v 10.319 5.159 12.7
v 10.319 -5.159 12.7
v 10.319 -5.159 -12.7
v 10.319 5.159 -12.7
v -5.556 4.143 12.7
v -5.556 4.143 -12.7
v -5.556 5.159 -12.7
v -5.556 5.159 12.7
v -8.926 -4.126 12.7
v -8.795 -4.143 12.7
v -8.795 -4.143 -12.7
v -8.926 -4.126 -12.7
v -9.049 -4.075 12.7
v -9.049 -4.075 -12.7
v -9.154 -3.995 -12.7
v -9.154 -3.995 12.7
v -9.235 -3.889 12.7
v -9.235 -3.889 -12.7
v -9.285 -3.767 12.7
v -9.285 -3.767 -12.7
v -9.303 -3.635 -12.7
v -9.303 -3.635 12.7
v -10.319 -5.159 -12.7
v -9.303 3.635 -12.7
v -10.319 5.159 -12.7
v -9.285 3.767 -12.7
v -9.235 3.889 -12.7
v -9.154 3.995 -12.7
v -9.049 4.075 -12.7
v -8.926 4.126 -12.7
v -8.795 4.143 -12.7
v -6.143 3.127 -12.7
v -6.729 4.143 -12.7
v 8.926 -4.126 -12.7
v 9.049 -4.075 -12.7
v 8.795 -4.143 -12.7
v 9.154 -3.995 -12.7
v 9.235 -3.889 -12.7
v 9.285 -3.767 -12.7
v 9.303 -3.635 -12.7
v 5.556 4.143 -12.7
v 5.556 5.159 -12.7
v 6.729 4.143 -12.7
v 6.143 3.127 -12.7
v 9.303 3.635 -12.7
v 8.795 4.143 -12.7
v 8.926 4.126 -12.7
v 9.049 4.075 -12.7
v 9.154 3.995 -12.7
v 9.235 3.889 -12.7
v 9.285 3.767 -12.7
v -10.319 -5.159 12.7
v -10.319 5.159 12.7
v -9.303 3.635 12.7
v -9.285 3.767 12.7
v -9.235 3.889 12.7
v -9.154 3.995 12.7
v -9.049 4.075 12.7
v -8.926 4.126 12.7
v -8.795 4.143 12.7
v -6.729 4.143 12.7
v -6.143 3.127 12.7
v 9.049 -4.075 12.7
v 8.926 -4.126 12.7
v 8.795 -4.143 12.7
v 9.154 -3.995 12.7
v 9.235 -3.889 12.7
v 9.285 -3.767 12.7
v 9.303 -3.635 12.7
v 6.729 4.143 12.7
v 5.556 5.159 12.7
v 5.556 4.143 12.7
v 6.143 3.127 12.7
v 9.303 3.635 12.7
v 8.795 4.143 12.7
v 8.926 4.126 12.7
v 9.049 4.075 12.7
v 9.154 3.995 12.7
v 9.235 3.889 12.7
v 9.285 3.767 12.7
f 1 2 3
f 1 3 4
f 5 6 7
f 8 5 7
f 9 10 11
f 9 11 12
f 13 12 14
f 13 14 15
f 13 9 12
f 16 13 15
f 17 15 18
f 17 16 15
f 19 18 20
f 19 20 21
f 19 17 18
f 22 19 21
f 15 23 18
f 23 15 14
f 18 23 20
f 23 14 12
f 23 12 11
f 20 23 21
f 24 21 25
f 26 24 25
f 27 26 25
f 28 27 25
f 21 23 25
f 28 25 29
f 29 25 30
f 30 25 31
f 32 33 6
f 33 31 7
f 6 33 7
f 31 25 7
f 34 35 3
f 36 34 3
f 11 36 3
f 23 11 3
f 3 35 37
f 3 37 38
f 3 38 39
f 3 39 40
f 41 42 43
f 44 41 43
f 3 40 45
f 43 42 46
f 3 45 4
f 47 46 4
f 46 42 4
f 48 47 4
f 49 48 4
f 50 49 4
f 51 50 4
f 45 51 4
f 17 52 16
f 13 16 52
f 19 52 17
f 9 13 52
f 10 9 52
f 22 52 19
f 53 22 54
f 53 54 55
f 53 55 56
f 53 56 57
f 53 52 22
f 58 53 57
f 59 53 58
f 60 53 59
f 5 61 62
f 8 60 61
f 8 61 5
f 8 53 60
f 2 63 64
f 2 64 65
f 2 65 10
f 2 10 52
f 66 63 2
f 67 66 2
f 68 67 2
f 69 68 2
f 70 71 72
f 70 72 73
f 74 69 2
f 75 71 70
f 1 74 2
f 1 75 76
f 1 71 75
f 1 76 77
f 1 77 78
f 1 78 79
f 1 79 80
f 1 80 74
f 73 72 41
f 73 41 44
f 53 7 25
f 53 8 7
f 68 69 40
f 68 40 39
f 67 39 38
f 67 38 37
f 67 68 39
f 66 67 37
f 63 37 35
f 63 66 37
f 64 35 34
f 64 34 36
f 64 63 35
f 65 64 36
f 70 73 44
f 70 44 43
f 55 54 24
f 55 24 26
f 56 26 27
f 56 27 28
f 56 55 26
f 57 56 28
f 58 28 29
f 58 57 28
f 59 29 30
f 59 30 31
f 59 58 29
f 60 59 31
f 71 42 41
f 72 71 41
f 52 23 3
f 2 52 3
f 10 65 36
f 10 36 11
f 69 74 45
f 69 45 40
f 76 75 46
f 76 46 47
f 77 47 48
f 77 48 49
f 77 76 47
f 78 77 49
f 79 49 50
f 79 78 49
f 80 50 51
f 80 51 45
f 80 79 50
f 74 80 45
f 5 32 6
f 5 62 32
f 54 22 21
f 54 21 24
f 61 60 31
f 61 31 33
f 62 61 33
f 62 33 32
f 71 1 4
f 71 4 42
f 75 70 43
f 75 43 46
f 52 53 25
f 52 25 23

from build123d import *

# Parameters (mm, degrees)
BASE_EXTRUDE_DEPTH = 12.7


with BuildPart() as part:
    # Sketch1 → Base-Extrude (new, symmetric)
    with BuildSketch(Plane.XY):
        with BuildLine():
            Line((-5.55625, 5.159375), (-10.31875, 5.159375))
            Line((-10.31875, 5.159375), (-10.31875, -5.159375))
            Line((-10.31875, -5.159375), (10.31875, -5.159375))
            Line((10.31875, -5.159375), (10.31875, 5.159375))
            Line((10.31875, 5.159375), (5.55625, 5.159375))
            Line((5.55625, 5.159375), (5.55625, 4.143375))
            Line((5.55625, 4.143375), (6.142837874, 3.127375))
            Line((6.142837874, 3.127375), (6.729425747, 4.143375))
            Line((6.729425747, 4.143375), (8.79475, 4.143375))
            ThreePointArc((8.79475, 4.143375), (9.153960245, 3.994585245), (9.30275, 3.635375))
            Line((9.30275, 3.635375), (9.30275, -3.635375))
            ThreePointArc((9.30275, -3.635375), (9.153960245, -3.994585245), (8.79475, -4.143375))
            Line((8.79475, -4.143375), (-8.79475, -4.143375))
            ThreePointArc((-8.79475, -4.143375), (-9.153960245, -3.994585245), (-9.30275, -3.635375))
            Line((-9.30275, -3.635375), (-9.30275, 3.635375))
            ThreePointArc((-9.30275, 3.635375), (-9.153960245, 3.994585245), (-8.79475, 4.143375))
            Line((-8.79475, 4.143375), (-6.729425747, 4.143375))
            Line((-6.729425747, 4.143375), (-6.142837874, 3.127375))
            Line((-6.142837874, 3.127375), (-5.55625, 4.143375))
            Line((-5.55625, 4.143375), (-5.55625, 5.159375))
        make_face()
    extrude(amount=BASE_EXTRUDE_DEPTH, both=True)


solid = part.part
